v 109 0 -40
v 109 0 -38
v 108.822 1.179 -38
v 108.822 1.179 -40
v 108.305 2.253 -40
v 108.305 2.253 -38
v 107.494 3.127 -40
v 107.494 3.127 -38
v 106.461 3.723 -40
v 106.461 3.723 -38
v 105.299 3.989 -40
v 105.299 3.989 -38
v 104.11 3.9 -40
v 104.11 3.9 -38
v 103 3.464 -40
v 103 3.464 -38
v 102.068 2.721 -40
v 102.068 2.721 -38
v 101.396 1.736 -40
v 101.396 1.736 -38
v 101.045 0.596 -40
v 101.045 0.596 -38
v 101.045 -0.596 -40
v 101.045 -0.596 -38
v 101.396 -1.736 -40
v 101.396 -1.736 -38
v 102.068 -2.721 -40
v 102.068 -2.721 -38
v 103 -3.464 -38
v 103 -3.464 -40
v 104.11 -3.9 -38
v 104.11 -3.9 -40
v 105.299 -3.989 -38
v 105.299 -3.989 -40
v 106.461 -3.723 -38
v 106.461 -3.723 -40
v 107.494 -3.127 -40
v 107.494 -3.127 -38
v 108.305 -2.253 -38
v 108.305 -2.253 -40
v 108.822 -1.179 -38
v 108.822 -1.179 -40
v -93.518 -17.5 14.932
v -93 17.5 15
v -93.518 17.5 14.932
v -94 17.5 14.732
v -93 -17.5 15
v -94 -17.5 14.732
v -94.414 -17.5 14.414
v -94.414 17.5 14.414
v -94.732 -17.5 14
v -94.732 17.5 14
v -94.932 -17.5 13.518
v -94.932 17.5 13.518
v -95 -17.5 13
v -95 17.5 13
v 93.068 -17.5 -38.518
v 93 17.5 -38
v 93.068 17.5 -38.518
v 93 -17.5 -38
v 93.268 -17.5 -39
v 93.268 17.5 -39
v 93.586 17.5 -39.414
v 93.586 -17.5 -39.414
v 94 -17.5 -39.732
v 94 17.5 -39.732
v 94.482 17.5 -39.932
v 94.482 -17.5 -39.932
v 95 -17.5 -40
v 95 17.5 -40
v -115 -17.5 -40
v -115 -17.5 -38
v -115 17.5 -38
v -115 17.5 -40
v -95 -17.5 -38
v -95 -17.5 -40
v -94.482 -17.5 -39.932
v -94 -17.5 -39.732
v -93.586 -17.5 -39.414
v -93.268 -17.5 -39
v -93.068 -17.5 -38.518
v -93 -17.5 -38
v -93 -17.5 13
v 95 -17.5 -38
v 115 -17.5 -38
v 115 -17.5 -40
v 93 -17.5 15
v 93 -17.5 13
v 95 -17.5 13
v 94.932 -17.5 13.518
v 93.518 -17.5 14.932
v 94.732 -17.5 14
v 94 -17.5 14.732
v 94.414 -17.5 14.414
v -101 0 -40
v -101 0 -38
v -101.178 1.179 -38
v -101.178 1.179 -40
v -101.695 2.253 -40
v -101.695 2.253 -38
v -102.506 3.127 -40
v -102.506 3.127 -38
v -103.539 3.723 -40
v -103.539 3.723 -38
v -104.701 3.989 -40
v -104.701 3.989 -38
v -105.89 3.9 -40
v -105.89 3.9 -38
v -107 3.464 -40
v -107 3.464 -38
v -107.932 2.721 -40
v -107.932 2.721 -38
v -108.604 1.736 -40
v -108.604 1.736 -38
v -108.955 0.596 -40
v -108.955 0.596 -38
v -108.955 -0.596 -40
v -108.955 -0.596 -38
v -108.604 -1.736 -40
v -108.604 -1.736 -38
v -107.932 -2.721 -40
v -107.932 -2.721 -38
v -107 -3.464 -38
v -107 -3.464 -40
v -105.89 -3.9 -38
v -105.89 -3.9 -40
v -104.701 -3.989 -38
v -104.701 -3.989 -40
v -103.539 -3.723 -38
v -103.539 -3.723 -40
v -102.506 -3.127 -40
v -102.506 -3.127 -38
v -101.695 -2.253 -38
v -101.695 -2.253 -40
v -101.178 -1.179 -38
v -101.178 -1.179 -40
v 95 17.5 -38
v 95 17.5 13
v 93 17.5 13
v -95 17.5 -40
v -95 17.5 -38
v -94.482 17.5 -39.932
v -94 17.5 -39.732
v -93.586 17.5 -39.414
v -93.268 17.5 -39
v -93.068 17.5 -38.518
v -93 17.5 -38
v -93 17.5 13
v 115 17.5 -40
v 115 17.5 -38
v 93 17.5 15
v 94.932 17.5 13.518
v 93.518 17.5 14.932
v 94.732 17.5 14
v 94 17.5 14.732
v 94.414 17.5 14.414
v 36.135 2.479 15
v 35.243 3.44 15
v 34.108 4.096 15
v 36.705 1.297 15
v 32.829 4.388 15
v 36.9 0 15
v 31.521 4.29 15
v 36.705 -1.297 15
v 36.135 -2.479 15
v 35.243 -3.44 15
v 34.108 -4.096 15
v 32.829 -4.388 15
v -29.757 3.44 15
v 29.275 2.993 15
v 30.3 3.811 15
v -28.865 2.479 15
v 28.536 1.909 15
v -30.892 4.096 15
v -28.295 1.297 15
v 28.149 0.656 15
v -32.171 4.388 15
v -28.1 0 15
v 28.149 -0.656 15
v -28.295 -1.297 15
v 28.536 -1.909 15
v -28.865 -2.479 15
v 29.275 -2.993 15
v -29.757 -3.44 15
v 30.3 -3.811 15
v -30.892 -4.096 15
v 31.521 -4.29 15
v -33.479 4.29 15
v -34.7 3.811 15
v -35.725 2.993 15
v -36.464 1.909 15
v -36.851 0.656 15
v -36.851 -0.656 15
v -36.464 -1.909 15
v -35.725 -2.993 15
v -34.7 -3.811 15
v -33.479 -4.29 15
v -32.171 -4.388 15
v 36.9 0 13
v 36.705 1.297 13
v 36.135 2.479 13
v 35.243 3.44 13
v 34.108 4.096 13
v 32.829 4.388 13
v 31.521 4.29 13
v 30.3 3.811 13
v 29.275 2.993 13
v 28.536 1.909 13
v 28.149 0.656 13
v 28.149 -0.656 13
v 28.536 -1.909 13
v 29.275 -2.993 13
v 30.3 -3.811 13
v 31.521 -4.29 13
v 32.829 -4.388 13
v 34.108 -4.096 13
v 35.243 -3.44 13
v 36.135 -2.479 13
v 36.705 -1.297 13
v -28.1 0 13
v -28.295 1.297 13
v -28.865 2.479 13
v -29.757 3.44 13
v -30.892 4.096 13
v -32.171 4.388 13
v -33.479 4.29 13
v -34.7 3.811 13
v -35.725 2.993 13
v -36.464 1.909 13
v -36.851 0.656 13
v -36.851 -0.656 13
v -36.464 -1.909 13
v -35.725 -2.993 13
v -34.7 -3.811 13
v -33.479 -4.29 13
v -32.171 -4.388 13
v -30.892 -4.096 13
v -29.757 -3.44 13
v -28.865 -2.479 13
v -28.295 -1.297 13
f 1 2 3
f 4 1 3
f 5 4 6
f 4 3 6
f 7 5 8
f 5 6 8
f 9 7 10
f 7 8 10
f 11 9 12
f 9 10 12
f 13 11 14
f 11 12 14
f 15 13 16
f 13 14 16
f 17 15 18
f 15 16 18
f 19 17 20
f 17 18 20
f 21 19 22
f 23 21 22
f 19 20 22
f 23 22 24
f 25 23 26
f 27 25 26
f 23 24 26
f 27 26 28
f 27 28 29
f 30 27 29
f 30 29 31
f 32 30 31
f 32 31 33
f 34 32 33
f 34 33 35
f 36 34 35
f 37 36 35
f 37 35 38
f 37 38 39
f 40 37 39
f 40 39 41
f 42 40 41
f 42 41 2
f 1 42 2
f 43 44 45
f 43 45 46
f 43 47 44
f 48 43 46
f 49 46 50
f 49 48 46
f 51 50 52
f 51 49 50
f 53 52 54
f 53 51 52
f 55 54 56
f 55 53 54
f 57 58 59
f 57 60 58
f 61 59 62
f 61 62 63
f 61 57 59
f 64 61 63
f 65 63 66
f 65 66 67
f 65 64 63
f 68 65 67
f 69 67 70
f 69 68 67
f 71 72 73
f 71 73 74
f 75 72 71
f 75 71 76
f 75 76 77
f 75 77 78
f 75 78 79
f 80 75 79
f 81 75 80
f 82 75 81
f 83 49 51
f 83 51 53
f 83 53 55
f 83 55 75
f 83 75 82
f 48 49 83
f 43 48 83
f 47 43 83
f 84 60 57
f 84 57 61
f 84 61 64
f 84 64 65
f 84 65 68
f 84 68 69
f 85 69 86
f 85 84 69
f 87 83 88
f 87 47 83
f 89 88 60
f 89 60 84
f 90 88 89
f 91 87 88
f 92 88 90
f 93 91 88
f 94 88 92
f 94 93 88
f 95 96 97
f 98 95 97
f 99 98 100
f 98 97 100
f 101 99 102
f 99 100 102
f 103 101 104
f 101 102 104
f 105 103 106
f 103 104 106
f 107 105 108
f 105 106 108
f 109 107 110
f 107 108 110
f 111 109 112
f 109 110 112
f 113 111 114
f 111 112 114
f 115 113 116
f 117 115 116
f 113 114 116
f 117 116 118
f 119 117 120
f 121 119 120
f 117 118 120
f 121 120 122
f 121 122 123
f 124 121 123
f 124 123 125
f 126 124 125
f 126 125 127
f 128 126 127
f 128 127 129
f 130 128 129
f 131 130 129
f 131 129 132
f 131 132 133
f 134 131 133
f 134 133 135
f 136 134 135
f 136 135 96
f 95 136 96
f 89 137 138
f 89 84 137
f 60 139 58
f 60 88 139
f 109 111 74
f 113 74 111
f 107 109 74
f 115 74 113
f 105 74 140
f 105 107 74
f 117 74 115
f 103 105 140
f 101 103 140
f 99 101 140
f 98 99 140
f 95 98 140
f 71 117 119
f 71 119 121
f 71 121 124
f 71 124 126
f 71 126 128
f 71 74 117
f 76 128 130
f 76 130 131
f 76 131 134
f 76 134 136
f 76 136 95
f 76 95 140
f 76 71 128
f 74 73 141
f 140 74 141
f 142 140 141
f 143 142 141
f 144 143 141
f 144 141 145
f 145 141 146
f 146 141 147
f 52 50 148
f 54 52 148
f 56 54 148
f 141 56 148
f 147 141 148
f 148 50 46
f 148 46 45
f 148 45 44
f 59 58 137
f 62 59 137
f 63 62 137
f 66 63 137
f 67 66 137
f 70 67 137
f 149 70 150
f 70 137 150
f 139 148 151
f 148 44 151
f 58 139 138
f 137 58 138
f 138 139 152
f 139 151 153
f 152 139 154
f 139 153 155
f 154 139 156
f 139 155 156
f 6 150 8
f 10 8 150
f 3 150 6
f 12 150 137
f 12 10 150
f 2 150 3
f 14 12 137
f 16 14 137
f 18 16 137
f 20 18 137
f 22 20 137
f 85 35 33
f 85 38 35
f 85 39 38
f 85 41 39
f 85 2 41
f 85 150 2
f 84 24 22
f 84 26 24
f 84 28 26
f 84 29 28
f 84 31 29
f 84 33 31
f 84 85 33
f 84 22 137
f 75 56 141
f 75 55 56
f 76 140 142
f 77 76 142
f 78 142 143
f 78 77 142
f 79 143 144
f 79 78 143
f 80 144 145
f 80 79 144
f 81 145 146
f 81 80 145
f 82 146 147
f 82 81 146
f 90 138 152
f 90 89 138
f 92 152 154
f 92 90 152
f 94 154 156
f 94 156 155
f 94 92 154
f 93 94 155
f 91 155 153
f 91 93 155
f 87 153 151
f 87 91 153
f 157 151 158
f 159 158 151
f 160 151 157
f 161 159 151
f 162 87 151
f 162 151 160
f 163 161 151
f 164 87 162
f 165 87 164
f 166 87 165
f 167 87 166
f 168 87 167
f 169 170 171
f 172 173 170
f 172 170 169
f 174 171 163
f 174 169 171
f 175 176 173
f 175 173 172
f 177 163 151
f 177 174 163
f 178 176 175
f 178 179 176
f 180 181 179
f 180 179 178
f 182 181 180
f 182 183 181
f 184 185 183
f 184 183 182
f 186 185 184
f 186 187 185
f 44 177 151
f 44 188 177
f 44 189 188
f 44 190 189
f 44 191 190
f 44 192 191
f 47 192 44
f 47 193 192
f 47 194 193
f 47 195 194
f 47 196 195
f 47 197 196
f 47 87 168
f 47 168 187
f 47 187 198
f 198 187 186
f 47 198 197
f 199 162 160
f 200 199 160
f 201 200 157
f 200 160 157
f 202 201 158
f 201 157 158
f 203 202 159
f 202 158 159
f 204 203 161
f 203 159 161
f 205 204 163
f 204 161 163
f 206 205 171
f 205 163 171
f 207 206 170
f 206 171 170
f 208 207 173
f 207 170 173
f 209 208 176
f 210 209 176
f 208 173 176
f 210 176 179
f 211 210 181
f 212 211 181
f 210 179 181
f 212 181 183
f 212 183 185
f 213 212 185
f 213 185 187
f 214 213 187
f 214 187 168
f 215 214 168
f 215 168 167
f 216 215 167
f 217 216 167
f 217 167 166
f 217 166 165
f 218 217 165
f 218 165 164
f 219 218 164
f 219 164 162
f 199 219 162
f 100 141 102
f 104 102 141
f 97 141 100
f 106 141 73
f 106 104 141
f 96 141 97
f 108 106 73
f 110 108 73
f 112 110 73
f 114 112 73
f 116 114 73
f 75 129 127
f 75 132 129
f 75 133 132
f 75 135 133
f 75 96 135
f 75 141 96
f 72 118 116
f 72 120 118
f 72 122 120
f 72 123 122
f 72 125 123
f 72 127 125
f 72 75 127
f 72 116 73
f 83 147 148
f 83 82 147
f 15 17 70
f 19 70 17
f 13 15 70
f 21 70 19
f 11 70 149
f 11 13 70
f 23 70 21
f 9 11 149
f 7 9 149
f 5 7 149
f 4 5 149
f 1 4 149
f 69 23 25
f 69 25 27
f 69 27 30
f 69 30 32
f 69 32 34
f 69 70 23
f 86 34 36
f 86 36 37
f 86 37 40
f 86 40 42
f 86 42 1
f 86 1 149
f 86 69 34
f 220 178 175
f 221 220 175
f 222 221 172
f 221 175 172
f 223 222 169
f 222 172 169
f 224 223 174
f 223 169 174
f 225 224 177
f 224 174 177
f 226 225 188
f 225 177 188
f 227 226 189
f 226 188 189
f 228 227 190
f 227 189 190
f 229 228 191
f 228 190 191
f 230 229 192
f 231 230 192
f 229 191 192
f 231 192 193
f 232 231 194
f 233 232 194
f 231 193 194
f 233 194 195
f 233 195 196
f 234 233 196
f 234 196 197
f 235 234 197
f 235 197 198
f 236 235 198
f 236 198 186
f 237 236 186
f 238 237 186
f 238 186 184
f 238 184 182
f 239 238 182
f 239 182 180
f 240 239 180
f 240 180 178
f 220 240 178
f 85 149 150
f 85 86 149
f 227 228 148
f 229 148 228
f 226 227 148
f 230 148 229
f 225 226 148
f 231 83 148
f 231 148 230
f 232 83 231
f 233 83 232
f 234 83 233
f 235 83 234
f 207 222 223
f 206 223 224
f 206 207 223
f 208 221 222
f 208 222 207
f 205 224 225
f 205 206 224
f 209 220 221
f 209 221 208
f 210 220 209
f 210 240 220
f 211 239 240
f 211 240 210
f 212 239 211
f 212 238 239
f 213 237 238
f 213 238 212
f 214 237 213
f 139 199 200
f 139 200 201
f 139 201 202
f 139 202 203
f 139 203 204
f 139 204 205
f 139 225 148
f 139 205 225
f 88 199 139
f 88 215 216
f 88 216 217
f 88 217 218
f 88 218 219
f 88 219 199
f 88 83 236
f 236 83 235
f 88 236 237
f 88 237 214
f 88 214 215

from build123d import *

# Parameters (mm, degrees)
F1_DEPTH = 17.5
F2_R     = 4
F3_DEPTH = 25
F4_R     = 4.4
F5_DEPTH = 25
F6_R     = 2


# Not quite as in the source:
# - a feature names something its author has since deleted; it is built from what else it names


with BuildPart() as f1:
    # F0 (on Front) → F1 (new body, symmetric)
    with BuildSketch(Plane.XZ):
        Polygon((95, -38), (95, 15), (-95, 15), (-95, -38), (-115, -38), (-115, -40), (-93, -40), (-93, 13), (93, 13), (93, -40), (115, -40), (115, -38), align=None)
    extrude(amount=F1_DEPTH, both=True)

    # F2 (on face) → F3 (cut)
    with BuildSketch(Plane.XY.offset(-38)):
        with Locations((-105, 0)):
            Circle(F2_R)
        with Locations((105, 0)):
            Circle(F2_R)
    extrude(amount=-F3_DEPTH, mode=Mode.SUBTRACT)

    # F4 (on face) → F5 (cut)
    with BuildSketch(Plane.XY.offset(15)):
        with Locations((-32.5, 0)):
            Circle(F4_R)
        with Locations((32.5, 0)):
            Circle(F4_R)
    extrude(amount=-F5_DEPTH, mode=Mode.SUBTRACT)

    # F6
    f6_edges = [f1.edges().sort_by_distance(p)[0] for p in [
        (95, 0, 15),
        (-95, 0, 15),
        (-93, 0, -40),
        (93, 0, -40),
    ]]
    fillet(f6_edges, radius=F6_R)


solid = f1.part
